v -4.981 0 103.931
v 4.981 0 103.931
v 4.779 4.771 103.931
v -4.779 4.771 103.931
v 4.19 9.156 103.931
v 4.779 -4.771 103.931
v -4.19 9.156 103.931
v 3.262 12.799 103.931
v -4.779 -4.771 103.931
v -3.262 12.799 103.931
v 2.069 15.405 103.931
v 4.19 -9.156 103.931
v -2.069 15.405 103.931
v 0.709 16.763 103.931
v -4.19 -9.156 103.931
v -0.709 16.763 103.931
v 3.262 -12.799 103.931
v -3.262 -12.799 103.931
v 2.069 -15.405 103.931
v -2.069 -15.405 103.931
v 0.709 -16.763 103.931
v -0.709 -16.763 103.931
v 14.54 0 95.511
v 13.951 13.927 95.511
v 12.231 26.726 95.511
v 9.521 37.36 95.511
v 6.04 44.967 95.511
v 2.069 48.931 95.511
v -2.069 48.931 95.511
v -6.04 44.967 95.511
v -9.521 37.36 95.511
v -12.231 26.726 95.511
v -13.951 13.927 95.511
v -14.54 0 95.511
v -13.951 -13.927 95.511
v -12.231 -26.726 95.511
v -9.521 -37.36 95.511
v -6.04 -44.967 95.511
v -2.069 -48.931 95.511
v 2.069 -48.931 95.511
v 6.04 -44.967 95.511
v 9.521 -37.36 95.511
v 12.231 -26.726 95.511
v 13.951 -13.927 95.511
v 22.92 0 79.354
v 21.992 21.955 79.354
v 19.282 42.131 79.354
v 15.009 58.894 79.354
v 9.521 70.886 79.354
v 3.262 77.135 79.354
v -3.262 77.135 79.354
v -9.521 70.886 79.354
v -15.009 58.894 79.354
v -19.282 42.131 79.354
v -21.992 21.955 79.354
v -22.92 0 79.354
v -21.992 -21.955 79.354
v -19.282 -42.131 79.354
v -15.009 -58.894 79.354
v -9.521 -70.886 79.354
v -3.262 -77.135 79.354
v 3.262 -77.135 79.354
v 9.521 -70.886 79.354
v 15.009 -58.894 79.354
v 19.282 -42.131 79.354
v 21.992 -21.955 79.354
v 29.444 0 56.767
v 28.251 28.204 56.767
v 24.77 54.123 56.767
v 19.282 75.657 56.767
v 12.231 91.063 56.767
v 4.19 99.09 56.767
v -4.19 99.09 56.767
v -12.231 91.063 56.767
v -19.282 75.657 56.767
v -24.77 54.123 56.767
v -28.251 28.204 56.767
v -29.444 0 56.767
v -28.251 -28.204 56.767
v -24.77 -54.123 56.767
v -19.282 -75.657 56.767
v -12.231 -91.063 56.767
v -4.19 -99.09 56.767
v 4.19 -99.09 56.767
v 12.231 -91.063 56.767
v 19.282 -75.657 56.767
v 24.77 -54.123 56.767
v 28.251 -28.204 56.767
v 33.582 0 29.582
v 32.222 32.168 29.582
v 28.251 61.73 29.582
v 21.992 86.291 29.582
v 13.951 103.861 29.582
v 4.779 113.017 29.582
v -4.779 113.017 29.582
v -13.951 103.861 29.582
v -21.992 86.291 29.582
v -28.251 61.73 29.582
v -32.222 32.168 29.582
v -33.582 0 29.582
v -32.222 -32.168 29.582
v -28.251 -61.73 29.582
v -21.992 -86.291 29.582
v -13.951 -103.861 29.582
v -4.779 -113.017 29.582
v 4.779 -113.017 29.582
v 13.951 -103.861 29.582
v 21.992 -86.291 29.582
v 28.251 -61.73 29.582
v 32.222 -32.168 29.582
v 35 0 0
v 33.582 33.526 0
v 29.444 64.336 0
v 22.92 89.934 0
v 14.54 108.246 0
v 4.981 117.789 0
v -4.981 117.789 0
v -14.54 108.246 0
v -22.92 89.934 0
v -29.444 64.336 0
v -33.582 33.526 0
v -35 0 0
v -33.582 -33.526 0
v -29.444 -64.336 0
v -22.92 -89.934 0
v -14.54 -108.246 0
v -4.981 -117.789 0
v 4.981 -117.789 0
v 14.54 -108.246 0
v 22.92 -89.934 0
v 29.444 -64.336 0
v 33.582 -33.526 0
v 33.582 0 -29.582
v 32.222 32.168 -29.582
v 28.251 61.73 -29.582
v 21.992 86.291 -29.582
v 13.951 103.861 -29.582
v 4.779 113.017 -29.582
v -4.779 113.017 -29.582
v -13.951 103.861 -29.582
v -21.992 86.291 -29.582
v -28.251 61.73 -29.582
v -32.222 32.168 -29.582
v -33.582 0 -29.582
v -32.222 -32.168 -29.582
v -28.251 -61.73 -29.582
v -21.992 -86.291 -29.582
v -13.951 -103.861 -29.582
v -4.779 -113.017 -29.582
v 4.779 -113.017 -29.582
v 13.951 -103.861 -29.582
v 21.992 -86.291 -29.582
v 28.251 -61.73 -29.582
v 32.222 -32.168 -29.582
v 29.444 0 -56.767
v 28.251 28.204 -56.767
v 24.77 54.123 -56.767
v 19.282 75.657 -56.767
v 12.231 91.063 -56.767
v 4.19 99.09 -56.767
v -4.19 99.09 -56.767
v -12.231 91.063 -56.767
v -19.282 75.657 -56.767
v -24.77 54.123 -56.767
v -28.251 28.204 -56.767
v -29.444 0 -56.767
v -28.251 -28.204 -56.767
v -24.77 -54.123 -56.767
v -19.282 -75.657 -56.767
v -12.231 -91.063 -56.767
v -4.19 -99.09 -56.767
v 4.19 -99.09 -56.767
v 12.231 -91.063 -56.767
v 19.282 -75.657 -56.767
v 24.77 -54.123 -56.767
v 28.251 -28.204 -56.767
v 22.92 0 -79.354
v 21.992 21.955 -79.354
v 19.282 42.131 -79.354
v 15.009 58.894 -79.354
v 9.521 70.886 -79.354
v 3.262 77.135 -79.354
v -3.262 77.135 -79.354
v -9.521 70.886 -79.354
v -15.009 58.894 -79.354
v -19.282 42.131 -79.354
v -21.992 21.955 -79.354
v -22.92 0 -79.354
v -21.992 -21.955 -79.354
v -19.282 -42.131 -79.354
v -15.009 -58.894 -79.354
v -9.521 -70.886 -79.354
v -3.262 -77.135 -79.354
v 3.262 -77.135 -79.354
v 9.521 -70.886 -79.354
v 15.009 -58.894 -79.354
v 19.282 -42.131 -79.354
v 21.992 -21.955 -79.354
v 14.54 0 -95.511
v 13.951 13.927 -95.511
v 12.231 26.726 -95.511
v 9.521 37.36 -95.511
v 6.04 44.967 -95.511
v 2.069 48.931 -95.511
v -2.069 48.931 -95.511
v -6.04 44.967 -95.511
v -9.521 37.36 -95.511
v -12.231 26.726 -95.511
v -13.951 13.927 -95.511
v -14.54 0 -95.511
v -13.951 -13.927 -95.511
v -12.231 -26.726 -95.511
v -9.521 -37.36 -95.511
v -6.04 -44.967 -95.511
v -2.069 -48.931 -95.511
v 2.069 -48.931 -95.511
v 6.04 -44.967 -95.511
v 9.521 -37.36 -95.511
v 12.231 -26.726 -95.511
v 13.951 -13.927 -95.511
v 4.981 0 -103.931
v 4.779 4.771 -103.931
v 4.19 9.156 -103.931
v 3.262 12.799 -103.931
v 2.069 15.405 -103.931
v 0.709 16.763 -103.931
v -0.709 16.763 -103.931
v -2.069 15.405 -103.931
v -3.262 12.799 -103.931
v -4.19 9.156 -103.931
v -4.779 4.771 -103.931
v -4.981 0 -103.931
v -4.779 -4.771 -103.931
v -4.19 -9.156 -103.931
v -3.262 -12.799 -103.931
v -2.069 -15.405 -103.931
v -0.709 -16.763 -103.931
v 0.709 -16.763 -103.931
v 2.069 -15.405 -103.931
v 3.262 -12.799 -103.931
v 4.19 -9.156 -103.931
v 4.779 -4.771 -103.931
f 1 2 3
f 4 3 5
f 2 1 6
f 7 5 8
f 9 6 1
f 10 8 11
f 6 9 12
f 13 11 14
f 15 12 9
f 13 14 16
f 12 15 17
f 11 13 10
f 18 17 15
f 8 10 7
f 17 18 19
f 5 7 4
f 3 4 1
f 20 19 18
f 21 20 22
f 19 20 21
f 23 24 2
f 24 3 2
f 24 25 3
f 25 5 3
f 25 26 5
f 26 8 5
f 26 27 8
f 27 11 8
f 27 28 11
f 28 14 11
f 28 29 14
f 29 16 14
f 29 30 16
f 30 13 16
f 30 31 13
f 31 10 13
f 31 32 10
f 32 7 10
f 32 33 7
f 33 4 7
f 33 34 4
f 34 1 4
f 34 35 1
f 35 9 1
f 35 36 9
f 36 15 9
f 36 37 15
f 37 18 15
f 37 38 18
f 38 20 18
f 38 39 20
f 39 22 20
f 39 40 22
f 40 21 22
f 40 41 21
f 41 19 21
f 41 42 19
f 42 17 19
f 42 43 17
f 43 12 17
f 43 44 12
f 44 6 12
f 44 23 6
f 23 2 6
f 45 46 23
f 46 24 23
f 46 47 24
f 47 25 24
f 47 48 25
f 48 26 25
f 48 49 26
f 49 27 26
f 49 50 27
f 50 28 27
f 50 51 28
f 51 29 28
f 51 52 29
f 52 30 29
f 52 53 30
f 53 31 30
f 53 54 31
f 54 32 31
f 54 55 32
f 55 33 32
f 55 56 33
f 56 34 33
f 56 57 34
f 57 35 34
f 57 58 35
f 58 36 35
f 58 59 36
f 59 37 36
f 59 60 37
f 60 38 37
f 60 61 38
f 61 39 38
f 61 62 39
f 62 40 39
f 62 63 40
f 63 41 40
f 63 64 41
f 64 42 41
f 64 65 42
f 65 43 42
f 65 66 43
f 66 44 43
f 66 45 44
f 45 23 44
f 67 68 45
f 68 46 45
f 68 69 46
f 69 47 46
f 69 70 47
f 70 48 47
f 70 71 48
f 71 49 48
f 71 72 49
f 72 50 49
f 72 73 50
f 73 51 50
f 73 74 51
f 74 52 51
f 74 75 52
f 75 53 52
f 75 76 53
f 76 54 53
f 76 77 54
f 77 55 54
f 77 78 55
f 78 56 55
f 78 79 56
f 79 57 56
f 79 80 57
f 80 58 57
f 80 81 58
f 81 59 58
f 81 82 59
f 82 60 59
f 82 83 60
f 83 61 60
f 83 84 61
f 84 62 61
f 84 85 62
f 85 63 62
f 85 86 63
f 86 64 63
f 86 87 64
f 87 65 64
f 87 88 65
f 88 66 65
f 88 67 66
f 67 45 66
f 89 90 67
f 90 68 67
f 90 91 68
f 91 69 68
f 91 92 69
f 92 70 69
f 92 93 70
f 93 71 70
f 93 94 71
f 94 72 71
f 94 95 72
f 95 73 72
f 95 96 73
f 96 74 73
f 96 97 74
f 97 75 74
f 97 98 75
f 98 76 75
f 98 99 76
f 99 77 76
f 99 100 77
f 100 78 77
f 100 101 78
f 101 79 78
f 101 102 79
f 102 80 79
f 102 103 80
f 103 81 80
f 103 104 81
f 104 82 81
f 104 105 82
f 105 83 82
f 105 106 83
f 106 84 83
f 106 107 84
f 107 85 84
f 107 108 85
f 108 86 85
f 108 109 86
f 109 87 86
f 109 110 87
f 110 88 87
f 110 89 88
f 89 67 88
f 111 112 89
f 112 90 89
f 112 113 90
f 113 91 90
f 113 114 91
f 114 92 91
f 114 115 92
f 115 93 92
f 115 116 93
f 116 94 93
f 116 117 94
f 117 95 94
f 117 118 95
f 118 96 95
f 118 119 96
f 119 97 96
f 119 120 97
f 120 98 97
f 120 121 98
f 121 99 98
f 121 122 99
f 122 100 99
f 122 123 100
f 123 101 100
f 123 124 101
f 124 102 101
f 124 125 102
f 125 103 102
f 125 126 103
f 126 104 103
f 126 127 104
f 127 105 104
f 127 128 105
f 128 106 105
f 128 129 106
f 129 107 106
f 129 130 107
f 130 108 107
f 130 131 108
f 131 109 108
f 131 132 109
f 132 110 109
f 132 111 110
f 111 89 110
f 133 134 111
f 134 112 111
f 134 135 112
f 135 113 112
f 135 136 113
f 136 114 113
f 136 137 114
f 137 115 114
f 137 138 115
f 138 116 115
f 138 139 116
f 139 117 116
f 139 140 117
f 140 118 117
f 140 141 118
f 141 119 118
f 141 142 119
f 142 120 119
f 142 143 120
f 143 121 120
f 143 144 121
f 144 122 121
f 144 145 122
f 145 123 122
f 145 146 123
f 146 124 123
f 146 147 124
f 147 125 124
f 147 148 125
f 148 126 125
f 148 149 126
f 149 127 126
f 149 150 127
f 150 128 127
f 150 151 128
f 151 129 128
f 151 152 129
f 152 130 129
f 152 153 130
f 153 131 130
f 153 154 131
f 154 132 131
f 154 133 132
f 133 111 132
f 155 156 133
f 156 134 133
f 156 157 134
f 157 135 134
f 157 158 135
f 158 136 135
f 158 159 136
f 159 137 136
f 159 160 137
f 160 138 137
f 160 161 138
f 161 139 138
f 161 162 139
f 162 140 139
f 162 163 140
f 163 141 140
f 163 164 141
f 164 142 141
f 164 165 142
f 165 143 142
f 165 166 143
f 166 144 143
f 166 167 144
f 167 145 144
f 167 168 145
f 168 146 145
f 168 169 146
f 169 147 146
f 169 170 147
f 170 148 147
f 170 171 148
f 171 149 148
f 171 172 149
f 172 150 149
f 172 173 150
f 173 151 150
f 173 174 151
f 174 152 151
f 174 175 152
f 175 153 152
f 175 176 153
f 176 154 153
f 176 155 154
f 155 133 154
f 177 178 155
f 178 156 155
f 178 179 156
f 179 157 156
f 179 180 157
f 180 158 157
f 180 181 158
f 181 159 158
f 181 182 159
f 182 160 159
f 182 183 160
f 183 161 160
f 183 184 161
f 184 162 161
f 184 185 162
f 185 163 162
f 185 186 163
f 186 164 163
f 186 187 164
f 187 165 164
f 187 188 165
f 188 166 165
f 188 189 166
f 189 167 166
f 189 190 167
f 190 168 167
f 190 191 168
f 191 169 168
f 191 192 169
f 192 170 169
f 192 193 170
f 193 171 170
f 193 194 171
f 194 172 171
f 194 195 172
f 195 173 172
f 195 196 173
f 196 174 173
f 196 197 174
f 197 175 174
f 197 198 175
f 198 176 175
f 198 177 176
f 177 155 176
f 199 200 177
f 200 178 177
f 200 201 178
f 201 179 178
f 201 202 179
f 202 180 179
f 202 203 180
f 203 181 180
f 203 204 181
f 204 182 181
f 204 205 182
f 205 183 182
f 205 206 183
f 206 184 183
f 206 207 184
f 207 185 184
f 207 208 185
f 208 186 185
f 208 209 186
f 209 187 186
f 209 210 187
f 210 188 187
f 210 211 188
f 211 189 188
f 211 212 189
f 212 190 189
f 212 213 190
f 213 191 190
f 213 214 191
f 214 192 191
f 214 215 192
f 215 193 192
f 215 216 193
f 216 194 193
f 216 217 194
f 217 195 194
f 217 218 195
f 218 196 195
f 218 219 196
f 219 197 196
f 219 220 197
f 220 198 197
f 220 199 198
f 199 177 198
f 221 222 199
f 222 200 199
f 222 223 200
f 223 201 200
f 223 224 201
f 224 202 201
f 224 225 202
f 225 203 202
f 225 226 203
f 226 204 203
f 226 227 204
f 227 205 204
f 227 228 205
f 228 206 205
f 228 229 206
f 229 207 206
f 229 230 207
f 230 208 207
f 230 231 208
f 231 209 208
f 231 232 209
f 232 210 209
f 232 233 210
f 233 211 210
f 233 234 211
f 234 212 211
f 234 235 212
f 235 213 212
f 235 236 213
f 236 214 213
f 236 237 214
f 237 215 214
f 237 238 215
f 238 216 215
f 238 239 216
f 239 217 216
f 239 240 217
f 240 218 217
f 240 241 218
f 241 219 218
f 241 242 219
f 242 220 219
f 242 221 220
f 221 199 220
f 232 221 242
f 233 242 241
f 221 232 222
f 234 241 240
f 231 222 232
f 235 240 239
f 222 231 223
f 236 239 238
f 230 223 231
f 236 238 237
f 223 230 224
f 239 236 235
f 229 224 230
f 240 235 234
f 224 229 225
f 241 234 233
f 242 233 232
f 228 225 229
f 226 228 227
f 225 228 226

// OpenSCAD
// Generated by SolidPython 1.0.1 on 2020-07-29 00:46:47


scale(v = [5, 17, 15]) {
	sphere(r = 7);
}
/***********************************************
*********      SolidPython code:      **********
************************************************
 
# import packages: SolidPython
from solid import *
from solid.utils import *
from itertools import chain, combinations, permutations


class Resize:

    def __init__(self, scad_file):
        self.scad_file = scad_file
        #self.scad_file = import_scad(scad_file)
        # cone/cylinder param:
        self.r1 = 0
        self.r2 = 0
        self.h = 0
        # rectangular prism param:
        self.w = 0
        self.l = 0
        # ellipse param:
        self.r = 0

    # import OpenScad code (file name corresponds to shape)


    # classify shape + parameters
    def assign(self, param1, param2, param3):
        if self.scad_file == 'cone.scad':
            self.r1 = param1
            self.r2 = param2
            self.h = param3
        elif self.scad_file == 'cylinder.scad':
            self.r1 = param1
            self.r2 = param2
            self.h = param3
        elif self.scad_file == 'rectangularPrism.scad':
            self.h = param1
            self.l = param2
            self.w = param3
        else:
            self.r = param1
            self.h = param2

    # resize parameters
    def iterate(self):
        x = range(3, 20, 2)
        i = 1
        if self.scad_file == 'cone.scad':
            tempList = list(permutations(x, 2))
            for temp in tempList:
                param1 = temp[0]
                param2 = temp[1]
                filepath = 'produced_scad_files/' + 'cone' + str(param1) + '_' + str(param2) + '_' + '.scad'
                scad_render_to_file(cylinder(h=param1, r1=param2, r2=0), filepath)

        elif self.scad_file == 'cylinder.scad':
            tempList = list(permutations(x, 3))
            for temp in tempList:
                param1 = temp[0]
                param2 = temp[1]
                filepath = 'produced_scad_files/' + 'cylinder' + str(param1) + '_' + str(param2) + '_' + '.scad'
                scad_render_to_file(cylinder(h=param1, r1=param2, r2=param2), filepath)

        elif self.scad_file == 'rectangularPrism.scad':
            tempList = list(permutations(x, 3))
            for temp in tempList:
                param1 = temp[0]
                param2 = temp[1]
                param3 = temp[2]
                filepath = 'produced_scad_files/' + 'rectangularPrism' + str(param1) + '_' + str(param2) + '_' + str(
                    param3) + '.scad'
                scad_render_to_file(cube(size=(param1, param2, param3)), filepath)

        elif self.scad_file == 'ellipse.scad':
            tempList = list(permutations(x, 4))
            for temp in tempList:
                param1 = temp[0]
                param2 = temp[1]
                param3 = temp[2]
                param4 = temp[3]
                filepath = 'produced_scad_files/' + 'ellipse' + str(param1) + '_' + str(param2) + '_' + str(param3) + '_' + str(param4) + '.scad'
                scad_render_to_file(scale([param1, param2, param3])(sphere(r=param4)), filepath)

    def render_to_scadfile(self):
        scad_render_to_file(scad, 'example.scad') 
 
************************************************/
